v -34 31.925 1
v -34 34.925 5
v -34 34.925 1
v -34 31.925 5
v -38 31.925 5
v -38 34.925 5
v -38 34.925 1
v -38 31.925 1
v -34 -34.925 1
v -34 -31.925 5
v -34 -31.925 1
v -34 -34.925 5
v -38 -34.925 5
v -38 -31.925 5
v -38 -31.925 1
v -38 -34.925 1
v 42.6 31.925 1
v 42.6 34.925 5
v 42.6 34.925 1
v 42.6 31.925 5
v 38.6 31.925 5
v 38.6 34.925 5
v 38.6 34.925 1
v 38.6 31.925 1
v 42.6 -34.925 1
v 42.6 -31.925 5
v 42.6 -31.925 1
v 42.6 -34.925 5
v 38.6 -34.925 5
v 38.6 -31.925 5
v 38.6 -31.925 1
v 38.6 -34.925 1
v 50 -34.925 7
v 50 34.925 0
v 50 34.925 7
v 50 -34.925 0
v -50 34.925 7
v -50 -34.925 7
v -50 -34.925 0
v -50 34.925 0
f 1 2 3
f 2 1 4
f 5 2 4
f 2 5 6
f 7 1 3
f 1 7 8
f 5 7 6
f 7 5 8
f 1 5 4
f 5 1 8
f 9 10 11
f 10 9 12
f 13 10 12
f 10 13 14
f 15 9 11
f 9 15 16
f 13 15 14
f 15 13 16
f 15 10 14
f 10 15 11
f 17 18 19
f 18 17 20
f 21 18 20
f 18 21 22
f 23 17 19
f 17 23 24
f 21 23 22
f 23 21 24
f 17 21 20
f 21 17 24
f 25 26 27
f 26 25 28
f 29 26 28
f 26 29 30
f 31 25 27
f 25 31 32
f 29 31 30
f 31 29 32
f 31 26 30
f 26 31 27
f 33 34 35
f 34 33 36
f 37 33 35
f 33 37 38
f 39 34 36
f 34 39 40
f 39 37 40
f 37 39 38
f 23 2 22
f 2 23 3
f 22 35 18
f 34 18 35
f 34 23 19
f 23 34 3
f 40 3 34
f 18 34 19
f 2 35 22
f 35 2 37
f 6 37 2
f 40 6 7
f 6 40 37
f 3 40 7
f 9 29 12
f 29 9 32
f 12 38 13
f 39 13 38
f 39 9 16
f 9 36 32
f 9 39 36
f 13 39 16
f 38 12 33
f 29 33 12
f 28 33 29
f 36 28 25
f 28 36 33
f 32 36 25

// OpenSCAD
// file: common.scad
// Small helpers shared by the part files. Include after params.scad.

// An axis-aligned box given by its extents, as task.py's _mm(x0, x1, y0, y1, z0, z1) does.
module box(x0, x1, y0, y1, z0, z1) {
    translate([x0, y0, z0]) cube([x1 - x0, y1 - y0, z1 - z0]);
}

// A round hole or rod along +y from y0 to y1, its axis at (x, z).
module ybore(x, y0, y1, z, d) {
    translate([x, y0, z]) rotate([-90, 0, 0]) cylinder(d = d, h = y1 - y0);
}
// file: params.scad
// Shared dimensions for the printed carrier, sprung rail, guide-rod mounts and SSD dummy (all in mm, grams, N/mm).
//
// Every line is either
//   NAME = value; // task.py: <expression>   a number taken from task.py; check_params.py evaluates <expression>
//                                            against the imported task module (box(BOXES, i) gives a box's
//                                            [x0, x1, y0, y1, z0, z1] in mm) and asserts it equals value
//   NAME = value; // fab: <reason>           a fabrication choice (fit, hardware size); check_params.py checks
//                                            that these are consistent with the task numbers
// Keep one assignment per line and use only numbers, + - * /, names and [ ] lists: check_params.py parses this file.
//
// Frames, as in task.py:
//   carrier: origin on the table under the carrier's centre; x along the carrier, handle bezel toward -x, the drive's
//            connector end (rear) at +x; y across, the sprung rail at +y, the fixed rail at -y; z up.
//   SSD:     origin under the drive's centre on its bottom face; x along it, connector end toward +x; z up.

// ---- the SSD (task.py "the SSD, in its own frame") -----------------------------------------------------------------
SSD_L = 100; // task.py: SSD_L * 1000
SSD_W = 69.85; // task.py: SSD_W * 1000
SSD_H = 7; // task.py: SSD_H * 1000
SSD_MASS_G = 55; // task.py: SSD_MASS * 1000
HALF_W = 34.925; // task.py: HALF_W
HOLE_X = [-36.0, 40.6]; // task.py: HOLE_X
HOLE_Z = 3; // task.py: HOLE_Z
HOLE = 4; // task.py: HOLE
HOLE_DEPTH = 3; // task.py: HOLE_DEPTH
CONN_X = [44, 50]; // task.py: box(SSD_BOXES, 1)[0:2]
CONN_Y = [-31.925, 0]; // task.py: box(SSD_BOXES, 1)[2:4]
LABEL_X = [-42, 30]; // task.py: box(SSD_BOXES, 3)[0:2]
LABEL_Y = [-26, 26]; // task.py: box(SSD_BOXES, 3)[2:4]

// ---- the carrier (task.py "the carrier, in its own frame") ---------------------------------------------------------
CAR_L = 140; // task.py: CAR_L * 1000
CAR_W = 76; // task.py: CAR_W * 1000
CAR_H = 15; // task.py: CAR_H * 1000
CAR_MASS_G = 200; // task.py: CAR_MASS * 1000
SEAT_X = 20; // task.py: SX
SEAT_Z = 4; // task.py: SZ
GAP = 0.5; // task.py: GAP
PIN = 2.5; // task.py: PIN
PIN_IN = 2; // task.py: PIN_IN
RAIL_T = 3; // task.py: RAIL_T
RAIL_IN = 35.425; // task.py: RAIL_IN
RAIL_OUT = 38.425; // task.py: RAIL_OUT
PIN_X = [-16.0, 60.6]; // task.py: PIN_X
PIN_Z = 7; // task.py: PIN_Z
RAIL_SEGS = [[-61, -4], [48, 70]]; // task.py: RAIL_SEGS
RIB_X = [[-25, -10], [50, 65]]; // task.py: RIB_X
RIB_Y_END = 33; // task.py: box(CARRIER_BOXES, 3)[3]
BEZEL_X = [-70, -62]; // task.py: box(CARRIER_BOXES, 0)[0:2]
BEZEL_Y = 38; // task.py: box(CARRIER_BOXES, 0)[3]
HANDLE_X = [-74, -70]; // task.py: box(CARRIER_BOXES, 1)[0:2]
HANDLE_Y = 25; // task.py: box(CARRIER_BOXES, 1)[3]
HANDLE_Z = [3, 12]; // task.py: box(CARRIER_BOXES, 1)[4:6]
FLOOR_X = [-62, -34]; // task.py: box(CARRIER_BOXES, 2)[0:2]
FLOOR_Y = 33; // task.py: box(CARRIER_BOXES, 2)[3]
FLOOR_H = 3; // task.py: box(CARRIER_BOXES, 2)[5]
FIXED_BAR_X = [-70, 70]; // task.py: box(CARRIER_BOXES, 5)[0:2]
FIXED_BAR_H = 3; // task.py: box(CARRIER_BOXES, 5)[5]
FIXED_SEG0_X0 = -62; // task.py: box(CARRIER_BOXES, 6)[0]
RAIL_H = 12; // task.py: box(CARRIER_BOXES, 6)[5]

// ---- the sprung rail (task.py _latch_rail) -------------------------------------------------------------------------
RAIL_Z0 = 1; // task.py: box(rail.boxes, 0)[4]
RAIL_BAR_X = [-61, 70]; // task.py: box(rail.boxes, 2)[0:2]
RAIL_BAR_H = 3; // task.py: box(rail.boxes, 2)[5]
RAIL_TRAVEL = 7; // task.py: RAIL_TRAVEL * 1000
RAIL_RATE = 0.15; // task.py: RAIL_RATE / 1000
RAIL_MASS_G = 30; // task.py: rail.mass * 1000
TAB_X = [-61, -49]; // task.py: TAB_X
TAB_Y = [46.425, 48.925]; // task.py: TAB_Y
TAB_Z = [8, 34]; // task.py: TAB_Z
BRACKET_Z = [8, 12]; // task.py: box(rail.boxes, 3)[4:6]

// ---- print fits (fabrication choices) ------------------------------------------------------------------------------
SLIDE_CLR = 0.3; // fab: diametral clearance of a sliding fit (rod in its mount bore), and the rail's floor clearance
PRESS_CLR = 0; // fab: printed at nominal size for a press fit; horizontal printed holes come out slightly small
POCKET_CLR = 0.3; // fab: clearance round ballast plates and bars in their pockets
$fn = 48; // fab: facets on round holes

// ---- hardware (fabrication choices) --------------------------------------------------------------------------------
PIN_D = 2.5; // fab: 2.5 mm steel dowel pin, as wide as the task's 2.5 mm square pins (0.75 mm clear in a 4 mm hole)
PIN_L = 6; // fab: dowel pin length; PIN_IN + GAP stands proud of the rail, the rest is pressed in
PIN_BOSS = PIN_L - PIN_IN - GAP - RAIL_T; // fab: 0.5 mm pad on the rail's outer face so the pin sits flush there
ROD_D = 3; // fab: 3 mm ground steel rod (silver steel / drill rod / 3 mm linear shaft)
ROD_X = [-28, 52]; // fab: the two guide rods, one in each rail segment, clear of the pins and the pull tab
ROD_Z = 6.5; // fab: rod axis height, mid-height of the rail
BOSS_W = 8; // fab: width (along x) of the rod boss on the sprung rail's outer face
BOSS_L = 6; // fab: how far the rod boss stands out from the rail's outer face
ROD_EMBED = 8; // fab: depth of the blind press-fit bore for the rod in the rail and its boss
MOUNT_W = 12; // fab: guide-rod mount width along x
MOUNT_T = 10; // fab: guide-rod mount length along the rod (the sliding bore's length)
MOUNT_H = 12; // fab: guide-rod mount height
MOUNT_Y0 = RAIL_OUT + BOSS_L + RAIL_TRAVEL; // fab: the boss meets the mount's inner face at full travel (hard stop)
MOUNT_Y1 = MOUNT_Y0 + MOUNT_T; // fab: the mount's outer face
ROD_PROUD = 1; // fab: the rod stands 1 mm out of the mount's outer face with the rail closed
ROD_L = ROD_EMBED + RAIL_TRAVEL + MOUNT_T + ROD_PROUD; // fab: cut length of each guide rod (26 mm)
TONGUE_W = 20; // fab: width of the base web that carries each mount
N_SPRINGS = 2; // fab: one compression spring over each guide rod
SPRING_WIRE = 0.3; // fab: music (spring steel) wire diameter
SPRING_OD = 5; // fab: spring outside diameter (inside 4.4 mm, clear of the 3 mm rod)
SPRING_ACTIVE = 10; // fab: active coils; closed and ground ends add one dead coil at each end
SPRING_POCKET = 6; // fab: depth of the spring pocket in the mount; the spring's length at full travel
SPRING_PRELOAD = 0.5; // fab: compression already in each spring with the rail closed
SPRING_FREE = SPRING_POCKET + RAIL_TRAVEL + SPRING_PRELOAD; // fab: free length (13.5 mm)
SPRING_RATE = RAIL_RATE / N_SPRINGS; // fab: rate of each spring, 0.075 N/mm, so the pair matches the task's 150 N/m
SPRING_POCKET_D = SPRING_OD + 1; // fab: spring pocket diameter

// ---- the real fixture's floor and ballast (fabrication choices) ----------------------------------------------------
BASE_T = RAIL_Z0 - SLIDE_CLR; // fab: 0.7 mm base web under the whole carrier and the sprung rail, below the rail
STOP_H = 3; // fab: rib extensions up to y = RAIL_IN are the sprung rail's closed stop; they stay below the drive (4)
SLAB_X = [-10, 50]; // fab: ballast slab between the ribs, under the drive
SLAB_Y = 30; // fab: slab half-width (the fingers' room beside the drive is left open)
SLAB_H = 3.5; // fab: slab top, 0.5 mm below the seated drive's bottom face
SLAB_POCKET = [55, 55, 3]; // fab: steel ballast plate, 55 x 55 x 3 mm, set in from the top
BEZEL_POCKET = [6, 70, 12]; // fab: steel flat bar 6 x 12 mm, 70 mm long, set in the bezel from below
FLOOR_POCKET = [24, 60, 2]; // fab: steel plate 24 x 60 x 2 mm, set in the front floor plate from below
// main file
// SSD dummy: a 2.5-inch drive's envelope (SSD_L x SSD_W x SSD_H) with the task's four side holes (HOLE square,
// HOLE_DEPTH deep, centres HOLE_Z above the bottom face at HOLE_X along it; the connector end is +x). Drawn in the
// SSD frame of task.py: origin under its centre on its bottom face. Print it flat, bottom down, no supports (the holes
// bridge HOLE mm). Weigh it and adjust the infill to reach SSD_MASS_G (see BUILD.md); add a paper label on top over
// LABEL_X x LABEL_Y, and blacken the connector end over CONN_X x CONN_Y.

include <params.scad>
include <common.scad>

module ssd_dummy() {
    difference() {
        box(-SSD_L / 2, SSD_L / 2, -SSD_W / 2, SSD_W / 2, 0, SSD_H);
        for (x = HOLE_X) {
            // the +y side's holes, then the -y side's
            box(x - HOLE / 2, x + HOLE / 2, HALF_W - HOLE_DEPTH, HALF_W + 1, HOLE_Z - HOLE / 2, HOLE_Z + HOLE / 2);
            box(x - HOLE / 2, x + HOLE / 2, -HALF_W - 1, -HALF_W + HOLE_DEPTH, HOLE_Z - HOLE / 2, HOLE_Z + HOLE / 2);
        }
    }
}

ssd_dummy();
